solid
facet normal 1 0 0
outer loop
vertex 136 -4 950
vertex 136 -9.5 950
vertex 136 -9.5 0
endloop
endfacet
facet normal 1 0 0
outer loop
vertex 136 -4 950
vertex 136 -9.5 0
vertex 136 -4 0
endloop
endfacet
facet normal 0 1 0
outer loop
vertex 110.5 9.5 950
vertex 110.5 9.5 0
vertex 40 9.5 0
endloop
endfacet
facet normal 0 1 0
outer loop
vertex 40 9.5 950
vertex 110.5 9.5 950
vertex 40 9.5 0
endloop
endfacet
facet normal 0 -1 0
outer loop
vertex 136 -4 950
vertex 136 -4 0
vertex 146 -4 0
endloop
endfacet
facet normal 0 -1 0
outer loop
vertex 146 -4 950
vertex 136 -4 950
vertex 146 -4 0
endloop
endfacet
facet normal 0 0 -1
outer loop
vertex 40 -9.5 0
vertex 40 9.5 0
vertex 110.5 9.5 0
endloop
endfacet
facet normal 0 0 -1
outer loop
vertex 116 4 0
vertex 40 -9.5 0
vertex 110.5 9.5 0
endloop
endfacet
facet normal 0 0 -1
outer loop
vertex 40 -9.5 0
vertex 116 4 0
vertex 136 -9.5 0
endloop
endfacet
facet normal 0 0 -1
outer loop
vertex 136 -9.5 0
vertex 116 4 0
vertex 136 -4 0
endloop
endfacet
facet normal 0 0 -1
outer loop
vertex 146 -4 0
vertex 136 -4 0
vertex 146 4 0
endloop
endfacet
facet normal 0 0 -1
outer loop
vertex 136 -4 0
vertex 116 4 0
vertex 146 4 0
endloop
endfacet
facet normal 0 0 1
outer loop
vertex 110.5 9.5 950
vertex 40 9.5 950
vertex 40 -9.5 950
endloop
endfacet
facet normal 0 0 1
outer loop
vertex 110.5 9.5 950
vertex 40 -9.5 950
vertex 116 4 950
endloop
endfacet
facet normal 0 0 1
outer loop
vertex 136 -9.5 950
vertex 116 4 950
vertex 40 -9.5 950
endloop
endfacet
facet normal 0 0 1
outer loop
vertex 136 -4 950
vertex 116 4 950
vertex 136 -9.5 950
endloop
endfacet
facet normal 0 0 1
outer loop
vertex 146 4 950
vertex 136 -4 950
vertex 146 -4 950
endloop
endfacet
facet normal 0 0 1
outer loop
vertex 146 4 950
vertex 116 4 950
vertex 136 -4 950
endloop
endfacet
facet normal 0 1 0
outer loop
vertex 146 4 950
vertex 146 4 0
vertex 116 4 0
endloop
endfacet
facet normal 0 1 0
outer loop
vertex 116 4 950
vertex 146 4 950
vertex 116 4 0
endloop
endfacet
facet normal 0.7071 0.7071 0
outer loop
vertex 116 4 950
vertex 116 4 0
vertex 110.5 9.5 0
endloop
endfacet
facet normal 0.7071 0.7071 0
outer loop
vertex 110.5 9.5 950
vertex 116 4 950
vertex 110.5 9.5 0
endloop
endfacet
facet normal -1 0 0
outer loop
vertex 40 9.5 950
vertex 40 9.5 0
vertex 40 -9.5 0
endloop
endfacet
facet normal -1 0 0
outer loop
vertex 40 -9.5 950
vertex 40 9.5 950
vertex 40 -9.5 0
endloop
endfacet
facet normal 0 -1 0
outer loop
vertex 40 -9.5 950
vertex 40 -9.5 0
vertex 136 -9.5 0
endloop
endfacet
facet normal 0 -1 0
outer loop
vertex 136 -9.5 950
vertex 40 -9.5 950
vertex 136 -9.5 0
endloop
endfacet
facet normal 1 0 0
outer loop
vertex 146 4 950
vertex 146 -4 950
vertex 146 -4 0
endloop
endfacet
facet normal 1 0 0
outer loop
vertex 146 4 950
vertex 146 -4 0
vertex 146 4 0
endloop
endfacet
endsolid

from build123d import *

# Parameters (mm, degrees)
F1_DEPTH = 950
F2_W     = 12
F2_H     = 8
F3_DEPTH = 950.001


with BuildPart() as f1:
    # F0 (on Top) → F1 (new body)
    with BuildSketch(Plane.XY):
        Polygon((0, -4), (0, -9.5), (136, -9.5), (136, -4), (146, -4), (146, 4), (116, 4), (110.5, 9.5), (0, 9.5), (0, 4), (12, 4), (12, -4), align=None)
    extrude(amount=F1_DEPTH)

    # F2 (on face) → F3 (cut, through all)
    with BuildSketch(Plane(origin=(0, 0, 0), x_dir=(1, 0, 0), z_dir=(0, 0, -1))):
        Polygon((0, -9.5), (40, -9.5), (40, 9.5), (0, 9.5), (0, 4), (12, 4), (12, -4), (0, -4), align=None)
        with Locations((6, 0)):
            Rectangle(F2_W, F2_H)
    extrude(amount=-F3_DEPTH, mode=Mode.SUBTRACT)


solid = f1.part
